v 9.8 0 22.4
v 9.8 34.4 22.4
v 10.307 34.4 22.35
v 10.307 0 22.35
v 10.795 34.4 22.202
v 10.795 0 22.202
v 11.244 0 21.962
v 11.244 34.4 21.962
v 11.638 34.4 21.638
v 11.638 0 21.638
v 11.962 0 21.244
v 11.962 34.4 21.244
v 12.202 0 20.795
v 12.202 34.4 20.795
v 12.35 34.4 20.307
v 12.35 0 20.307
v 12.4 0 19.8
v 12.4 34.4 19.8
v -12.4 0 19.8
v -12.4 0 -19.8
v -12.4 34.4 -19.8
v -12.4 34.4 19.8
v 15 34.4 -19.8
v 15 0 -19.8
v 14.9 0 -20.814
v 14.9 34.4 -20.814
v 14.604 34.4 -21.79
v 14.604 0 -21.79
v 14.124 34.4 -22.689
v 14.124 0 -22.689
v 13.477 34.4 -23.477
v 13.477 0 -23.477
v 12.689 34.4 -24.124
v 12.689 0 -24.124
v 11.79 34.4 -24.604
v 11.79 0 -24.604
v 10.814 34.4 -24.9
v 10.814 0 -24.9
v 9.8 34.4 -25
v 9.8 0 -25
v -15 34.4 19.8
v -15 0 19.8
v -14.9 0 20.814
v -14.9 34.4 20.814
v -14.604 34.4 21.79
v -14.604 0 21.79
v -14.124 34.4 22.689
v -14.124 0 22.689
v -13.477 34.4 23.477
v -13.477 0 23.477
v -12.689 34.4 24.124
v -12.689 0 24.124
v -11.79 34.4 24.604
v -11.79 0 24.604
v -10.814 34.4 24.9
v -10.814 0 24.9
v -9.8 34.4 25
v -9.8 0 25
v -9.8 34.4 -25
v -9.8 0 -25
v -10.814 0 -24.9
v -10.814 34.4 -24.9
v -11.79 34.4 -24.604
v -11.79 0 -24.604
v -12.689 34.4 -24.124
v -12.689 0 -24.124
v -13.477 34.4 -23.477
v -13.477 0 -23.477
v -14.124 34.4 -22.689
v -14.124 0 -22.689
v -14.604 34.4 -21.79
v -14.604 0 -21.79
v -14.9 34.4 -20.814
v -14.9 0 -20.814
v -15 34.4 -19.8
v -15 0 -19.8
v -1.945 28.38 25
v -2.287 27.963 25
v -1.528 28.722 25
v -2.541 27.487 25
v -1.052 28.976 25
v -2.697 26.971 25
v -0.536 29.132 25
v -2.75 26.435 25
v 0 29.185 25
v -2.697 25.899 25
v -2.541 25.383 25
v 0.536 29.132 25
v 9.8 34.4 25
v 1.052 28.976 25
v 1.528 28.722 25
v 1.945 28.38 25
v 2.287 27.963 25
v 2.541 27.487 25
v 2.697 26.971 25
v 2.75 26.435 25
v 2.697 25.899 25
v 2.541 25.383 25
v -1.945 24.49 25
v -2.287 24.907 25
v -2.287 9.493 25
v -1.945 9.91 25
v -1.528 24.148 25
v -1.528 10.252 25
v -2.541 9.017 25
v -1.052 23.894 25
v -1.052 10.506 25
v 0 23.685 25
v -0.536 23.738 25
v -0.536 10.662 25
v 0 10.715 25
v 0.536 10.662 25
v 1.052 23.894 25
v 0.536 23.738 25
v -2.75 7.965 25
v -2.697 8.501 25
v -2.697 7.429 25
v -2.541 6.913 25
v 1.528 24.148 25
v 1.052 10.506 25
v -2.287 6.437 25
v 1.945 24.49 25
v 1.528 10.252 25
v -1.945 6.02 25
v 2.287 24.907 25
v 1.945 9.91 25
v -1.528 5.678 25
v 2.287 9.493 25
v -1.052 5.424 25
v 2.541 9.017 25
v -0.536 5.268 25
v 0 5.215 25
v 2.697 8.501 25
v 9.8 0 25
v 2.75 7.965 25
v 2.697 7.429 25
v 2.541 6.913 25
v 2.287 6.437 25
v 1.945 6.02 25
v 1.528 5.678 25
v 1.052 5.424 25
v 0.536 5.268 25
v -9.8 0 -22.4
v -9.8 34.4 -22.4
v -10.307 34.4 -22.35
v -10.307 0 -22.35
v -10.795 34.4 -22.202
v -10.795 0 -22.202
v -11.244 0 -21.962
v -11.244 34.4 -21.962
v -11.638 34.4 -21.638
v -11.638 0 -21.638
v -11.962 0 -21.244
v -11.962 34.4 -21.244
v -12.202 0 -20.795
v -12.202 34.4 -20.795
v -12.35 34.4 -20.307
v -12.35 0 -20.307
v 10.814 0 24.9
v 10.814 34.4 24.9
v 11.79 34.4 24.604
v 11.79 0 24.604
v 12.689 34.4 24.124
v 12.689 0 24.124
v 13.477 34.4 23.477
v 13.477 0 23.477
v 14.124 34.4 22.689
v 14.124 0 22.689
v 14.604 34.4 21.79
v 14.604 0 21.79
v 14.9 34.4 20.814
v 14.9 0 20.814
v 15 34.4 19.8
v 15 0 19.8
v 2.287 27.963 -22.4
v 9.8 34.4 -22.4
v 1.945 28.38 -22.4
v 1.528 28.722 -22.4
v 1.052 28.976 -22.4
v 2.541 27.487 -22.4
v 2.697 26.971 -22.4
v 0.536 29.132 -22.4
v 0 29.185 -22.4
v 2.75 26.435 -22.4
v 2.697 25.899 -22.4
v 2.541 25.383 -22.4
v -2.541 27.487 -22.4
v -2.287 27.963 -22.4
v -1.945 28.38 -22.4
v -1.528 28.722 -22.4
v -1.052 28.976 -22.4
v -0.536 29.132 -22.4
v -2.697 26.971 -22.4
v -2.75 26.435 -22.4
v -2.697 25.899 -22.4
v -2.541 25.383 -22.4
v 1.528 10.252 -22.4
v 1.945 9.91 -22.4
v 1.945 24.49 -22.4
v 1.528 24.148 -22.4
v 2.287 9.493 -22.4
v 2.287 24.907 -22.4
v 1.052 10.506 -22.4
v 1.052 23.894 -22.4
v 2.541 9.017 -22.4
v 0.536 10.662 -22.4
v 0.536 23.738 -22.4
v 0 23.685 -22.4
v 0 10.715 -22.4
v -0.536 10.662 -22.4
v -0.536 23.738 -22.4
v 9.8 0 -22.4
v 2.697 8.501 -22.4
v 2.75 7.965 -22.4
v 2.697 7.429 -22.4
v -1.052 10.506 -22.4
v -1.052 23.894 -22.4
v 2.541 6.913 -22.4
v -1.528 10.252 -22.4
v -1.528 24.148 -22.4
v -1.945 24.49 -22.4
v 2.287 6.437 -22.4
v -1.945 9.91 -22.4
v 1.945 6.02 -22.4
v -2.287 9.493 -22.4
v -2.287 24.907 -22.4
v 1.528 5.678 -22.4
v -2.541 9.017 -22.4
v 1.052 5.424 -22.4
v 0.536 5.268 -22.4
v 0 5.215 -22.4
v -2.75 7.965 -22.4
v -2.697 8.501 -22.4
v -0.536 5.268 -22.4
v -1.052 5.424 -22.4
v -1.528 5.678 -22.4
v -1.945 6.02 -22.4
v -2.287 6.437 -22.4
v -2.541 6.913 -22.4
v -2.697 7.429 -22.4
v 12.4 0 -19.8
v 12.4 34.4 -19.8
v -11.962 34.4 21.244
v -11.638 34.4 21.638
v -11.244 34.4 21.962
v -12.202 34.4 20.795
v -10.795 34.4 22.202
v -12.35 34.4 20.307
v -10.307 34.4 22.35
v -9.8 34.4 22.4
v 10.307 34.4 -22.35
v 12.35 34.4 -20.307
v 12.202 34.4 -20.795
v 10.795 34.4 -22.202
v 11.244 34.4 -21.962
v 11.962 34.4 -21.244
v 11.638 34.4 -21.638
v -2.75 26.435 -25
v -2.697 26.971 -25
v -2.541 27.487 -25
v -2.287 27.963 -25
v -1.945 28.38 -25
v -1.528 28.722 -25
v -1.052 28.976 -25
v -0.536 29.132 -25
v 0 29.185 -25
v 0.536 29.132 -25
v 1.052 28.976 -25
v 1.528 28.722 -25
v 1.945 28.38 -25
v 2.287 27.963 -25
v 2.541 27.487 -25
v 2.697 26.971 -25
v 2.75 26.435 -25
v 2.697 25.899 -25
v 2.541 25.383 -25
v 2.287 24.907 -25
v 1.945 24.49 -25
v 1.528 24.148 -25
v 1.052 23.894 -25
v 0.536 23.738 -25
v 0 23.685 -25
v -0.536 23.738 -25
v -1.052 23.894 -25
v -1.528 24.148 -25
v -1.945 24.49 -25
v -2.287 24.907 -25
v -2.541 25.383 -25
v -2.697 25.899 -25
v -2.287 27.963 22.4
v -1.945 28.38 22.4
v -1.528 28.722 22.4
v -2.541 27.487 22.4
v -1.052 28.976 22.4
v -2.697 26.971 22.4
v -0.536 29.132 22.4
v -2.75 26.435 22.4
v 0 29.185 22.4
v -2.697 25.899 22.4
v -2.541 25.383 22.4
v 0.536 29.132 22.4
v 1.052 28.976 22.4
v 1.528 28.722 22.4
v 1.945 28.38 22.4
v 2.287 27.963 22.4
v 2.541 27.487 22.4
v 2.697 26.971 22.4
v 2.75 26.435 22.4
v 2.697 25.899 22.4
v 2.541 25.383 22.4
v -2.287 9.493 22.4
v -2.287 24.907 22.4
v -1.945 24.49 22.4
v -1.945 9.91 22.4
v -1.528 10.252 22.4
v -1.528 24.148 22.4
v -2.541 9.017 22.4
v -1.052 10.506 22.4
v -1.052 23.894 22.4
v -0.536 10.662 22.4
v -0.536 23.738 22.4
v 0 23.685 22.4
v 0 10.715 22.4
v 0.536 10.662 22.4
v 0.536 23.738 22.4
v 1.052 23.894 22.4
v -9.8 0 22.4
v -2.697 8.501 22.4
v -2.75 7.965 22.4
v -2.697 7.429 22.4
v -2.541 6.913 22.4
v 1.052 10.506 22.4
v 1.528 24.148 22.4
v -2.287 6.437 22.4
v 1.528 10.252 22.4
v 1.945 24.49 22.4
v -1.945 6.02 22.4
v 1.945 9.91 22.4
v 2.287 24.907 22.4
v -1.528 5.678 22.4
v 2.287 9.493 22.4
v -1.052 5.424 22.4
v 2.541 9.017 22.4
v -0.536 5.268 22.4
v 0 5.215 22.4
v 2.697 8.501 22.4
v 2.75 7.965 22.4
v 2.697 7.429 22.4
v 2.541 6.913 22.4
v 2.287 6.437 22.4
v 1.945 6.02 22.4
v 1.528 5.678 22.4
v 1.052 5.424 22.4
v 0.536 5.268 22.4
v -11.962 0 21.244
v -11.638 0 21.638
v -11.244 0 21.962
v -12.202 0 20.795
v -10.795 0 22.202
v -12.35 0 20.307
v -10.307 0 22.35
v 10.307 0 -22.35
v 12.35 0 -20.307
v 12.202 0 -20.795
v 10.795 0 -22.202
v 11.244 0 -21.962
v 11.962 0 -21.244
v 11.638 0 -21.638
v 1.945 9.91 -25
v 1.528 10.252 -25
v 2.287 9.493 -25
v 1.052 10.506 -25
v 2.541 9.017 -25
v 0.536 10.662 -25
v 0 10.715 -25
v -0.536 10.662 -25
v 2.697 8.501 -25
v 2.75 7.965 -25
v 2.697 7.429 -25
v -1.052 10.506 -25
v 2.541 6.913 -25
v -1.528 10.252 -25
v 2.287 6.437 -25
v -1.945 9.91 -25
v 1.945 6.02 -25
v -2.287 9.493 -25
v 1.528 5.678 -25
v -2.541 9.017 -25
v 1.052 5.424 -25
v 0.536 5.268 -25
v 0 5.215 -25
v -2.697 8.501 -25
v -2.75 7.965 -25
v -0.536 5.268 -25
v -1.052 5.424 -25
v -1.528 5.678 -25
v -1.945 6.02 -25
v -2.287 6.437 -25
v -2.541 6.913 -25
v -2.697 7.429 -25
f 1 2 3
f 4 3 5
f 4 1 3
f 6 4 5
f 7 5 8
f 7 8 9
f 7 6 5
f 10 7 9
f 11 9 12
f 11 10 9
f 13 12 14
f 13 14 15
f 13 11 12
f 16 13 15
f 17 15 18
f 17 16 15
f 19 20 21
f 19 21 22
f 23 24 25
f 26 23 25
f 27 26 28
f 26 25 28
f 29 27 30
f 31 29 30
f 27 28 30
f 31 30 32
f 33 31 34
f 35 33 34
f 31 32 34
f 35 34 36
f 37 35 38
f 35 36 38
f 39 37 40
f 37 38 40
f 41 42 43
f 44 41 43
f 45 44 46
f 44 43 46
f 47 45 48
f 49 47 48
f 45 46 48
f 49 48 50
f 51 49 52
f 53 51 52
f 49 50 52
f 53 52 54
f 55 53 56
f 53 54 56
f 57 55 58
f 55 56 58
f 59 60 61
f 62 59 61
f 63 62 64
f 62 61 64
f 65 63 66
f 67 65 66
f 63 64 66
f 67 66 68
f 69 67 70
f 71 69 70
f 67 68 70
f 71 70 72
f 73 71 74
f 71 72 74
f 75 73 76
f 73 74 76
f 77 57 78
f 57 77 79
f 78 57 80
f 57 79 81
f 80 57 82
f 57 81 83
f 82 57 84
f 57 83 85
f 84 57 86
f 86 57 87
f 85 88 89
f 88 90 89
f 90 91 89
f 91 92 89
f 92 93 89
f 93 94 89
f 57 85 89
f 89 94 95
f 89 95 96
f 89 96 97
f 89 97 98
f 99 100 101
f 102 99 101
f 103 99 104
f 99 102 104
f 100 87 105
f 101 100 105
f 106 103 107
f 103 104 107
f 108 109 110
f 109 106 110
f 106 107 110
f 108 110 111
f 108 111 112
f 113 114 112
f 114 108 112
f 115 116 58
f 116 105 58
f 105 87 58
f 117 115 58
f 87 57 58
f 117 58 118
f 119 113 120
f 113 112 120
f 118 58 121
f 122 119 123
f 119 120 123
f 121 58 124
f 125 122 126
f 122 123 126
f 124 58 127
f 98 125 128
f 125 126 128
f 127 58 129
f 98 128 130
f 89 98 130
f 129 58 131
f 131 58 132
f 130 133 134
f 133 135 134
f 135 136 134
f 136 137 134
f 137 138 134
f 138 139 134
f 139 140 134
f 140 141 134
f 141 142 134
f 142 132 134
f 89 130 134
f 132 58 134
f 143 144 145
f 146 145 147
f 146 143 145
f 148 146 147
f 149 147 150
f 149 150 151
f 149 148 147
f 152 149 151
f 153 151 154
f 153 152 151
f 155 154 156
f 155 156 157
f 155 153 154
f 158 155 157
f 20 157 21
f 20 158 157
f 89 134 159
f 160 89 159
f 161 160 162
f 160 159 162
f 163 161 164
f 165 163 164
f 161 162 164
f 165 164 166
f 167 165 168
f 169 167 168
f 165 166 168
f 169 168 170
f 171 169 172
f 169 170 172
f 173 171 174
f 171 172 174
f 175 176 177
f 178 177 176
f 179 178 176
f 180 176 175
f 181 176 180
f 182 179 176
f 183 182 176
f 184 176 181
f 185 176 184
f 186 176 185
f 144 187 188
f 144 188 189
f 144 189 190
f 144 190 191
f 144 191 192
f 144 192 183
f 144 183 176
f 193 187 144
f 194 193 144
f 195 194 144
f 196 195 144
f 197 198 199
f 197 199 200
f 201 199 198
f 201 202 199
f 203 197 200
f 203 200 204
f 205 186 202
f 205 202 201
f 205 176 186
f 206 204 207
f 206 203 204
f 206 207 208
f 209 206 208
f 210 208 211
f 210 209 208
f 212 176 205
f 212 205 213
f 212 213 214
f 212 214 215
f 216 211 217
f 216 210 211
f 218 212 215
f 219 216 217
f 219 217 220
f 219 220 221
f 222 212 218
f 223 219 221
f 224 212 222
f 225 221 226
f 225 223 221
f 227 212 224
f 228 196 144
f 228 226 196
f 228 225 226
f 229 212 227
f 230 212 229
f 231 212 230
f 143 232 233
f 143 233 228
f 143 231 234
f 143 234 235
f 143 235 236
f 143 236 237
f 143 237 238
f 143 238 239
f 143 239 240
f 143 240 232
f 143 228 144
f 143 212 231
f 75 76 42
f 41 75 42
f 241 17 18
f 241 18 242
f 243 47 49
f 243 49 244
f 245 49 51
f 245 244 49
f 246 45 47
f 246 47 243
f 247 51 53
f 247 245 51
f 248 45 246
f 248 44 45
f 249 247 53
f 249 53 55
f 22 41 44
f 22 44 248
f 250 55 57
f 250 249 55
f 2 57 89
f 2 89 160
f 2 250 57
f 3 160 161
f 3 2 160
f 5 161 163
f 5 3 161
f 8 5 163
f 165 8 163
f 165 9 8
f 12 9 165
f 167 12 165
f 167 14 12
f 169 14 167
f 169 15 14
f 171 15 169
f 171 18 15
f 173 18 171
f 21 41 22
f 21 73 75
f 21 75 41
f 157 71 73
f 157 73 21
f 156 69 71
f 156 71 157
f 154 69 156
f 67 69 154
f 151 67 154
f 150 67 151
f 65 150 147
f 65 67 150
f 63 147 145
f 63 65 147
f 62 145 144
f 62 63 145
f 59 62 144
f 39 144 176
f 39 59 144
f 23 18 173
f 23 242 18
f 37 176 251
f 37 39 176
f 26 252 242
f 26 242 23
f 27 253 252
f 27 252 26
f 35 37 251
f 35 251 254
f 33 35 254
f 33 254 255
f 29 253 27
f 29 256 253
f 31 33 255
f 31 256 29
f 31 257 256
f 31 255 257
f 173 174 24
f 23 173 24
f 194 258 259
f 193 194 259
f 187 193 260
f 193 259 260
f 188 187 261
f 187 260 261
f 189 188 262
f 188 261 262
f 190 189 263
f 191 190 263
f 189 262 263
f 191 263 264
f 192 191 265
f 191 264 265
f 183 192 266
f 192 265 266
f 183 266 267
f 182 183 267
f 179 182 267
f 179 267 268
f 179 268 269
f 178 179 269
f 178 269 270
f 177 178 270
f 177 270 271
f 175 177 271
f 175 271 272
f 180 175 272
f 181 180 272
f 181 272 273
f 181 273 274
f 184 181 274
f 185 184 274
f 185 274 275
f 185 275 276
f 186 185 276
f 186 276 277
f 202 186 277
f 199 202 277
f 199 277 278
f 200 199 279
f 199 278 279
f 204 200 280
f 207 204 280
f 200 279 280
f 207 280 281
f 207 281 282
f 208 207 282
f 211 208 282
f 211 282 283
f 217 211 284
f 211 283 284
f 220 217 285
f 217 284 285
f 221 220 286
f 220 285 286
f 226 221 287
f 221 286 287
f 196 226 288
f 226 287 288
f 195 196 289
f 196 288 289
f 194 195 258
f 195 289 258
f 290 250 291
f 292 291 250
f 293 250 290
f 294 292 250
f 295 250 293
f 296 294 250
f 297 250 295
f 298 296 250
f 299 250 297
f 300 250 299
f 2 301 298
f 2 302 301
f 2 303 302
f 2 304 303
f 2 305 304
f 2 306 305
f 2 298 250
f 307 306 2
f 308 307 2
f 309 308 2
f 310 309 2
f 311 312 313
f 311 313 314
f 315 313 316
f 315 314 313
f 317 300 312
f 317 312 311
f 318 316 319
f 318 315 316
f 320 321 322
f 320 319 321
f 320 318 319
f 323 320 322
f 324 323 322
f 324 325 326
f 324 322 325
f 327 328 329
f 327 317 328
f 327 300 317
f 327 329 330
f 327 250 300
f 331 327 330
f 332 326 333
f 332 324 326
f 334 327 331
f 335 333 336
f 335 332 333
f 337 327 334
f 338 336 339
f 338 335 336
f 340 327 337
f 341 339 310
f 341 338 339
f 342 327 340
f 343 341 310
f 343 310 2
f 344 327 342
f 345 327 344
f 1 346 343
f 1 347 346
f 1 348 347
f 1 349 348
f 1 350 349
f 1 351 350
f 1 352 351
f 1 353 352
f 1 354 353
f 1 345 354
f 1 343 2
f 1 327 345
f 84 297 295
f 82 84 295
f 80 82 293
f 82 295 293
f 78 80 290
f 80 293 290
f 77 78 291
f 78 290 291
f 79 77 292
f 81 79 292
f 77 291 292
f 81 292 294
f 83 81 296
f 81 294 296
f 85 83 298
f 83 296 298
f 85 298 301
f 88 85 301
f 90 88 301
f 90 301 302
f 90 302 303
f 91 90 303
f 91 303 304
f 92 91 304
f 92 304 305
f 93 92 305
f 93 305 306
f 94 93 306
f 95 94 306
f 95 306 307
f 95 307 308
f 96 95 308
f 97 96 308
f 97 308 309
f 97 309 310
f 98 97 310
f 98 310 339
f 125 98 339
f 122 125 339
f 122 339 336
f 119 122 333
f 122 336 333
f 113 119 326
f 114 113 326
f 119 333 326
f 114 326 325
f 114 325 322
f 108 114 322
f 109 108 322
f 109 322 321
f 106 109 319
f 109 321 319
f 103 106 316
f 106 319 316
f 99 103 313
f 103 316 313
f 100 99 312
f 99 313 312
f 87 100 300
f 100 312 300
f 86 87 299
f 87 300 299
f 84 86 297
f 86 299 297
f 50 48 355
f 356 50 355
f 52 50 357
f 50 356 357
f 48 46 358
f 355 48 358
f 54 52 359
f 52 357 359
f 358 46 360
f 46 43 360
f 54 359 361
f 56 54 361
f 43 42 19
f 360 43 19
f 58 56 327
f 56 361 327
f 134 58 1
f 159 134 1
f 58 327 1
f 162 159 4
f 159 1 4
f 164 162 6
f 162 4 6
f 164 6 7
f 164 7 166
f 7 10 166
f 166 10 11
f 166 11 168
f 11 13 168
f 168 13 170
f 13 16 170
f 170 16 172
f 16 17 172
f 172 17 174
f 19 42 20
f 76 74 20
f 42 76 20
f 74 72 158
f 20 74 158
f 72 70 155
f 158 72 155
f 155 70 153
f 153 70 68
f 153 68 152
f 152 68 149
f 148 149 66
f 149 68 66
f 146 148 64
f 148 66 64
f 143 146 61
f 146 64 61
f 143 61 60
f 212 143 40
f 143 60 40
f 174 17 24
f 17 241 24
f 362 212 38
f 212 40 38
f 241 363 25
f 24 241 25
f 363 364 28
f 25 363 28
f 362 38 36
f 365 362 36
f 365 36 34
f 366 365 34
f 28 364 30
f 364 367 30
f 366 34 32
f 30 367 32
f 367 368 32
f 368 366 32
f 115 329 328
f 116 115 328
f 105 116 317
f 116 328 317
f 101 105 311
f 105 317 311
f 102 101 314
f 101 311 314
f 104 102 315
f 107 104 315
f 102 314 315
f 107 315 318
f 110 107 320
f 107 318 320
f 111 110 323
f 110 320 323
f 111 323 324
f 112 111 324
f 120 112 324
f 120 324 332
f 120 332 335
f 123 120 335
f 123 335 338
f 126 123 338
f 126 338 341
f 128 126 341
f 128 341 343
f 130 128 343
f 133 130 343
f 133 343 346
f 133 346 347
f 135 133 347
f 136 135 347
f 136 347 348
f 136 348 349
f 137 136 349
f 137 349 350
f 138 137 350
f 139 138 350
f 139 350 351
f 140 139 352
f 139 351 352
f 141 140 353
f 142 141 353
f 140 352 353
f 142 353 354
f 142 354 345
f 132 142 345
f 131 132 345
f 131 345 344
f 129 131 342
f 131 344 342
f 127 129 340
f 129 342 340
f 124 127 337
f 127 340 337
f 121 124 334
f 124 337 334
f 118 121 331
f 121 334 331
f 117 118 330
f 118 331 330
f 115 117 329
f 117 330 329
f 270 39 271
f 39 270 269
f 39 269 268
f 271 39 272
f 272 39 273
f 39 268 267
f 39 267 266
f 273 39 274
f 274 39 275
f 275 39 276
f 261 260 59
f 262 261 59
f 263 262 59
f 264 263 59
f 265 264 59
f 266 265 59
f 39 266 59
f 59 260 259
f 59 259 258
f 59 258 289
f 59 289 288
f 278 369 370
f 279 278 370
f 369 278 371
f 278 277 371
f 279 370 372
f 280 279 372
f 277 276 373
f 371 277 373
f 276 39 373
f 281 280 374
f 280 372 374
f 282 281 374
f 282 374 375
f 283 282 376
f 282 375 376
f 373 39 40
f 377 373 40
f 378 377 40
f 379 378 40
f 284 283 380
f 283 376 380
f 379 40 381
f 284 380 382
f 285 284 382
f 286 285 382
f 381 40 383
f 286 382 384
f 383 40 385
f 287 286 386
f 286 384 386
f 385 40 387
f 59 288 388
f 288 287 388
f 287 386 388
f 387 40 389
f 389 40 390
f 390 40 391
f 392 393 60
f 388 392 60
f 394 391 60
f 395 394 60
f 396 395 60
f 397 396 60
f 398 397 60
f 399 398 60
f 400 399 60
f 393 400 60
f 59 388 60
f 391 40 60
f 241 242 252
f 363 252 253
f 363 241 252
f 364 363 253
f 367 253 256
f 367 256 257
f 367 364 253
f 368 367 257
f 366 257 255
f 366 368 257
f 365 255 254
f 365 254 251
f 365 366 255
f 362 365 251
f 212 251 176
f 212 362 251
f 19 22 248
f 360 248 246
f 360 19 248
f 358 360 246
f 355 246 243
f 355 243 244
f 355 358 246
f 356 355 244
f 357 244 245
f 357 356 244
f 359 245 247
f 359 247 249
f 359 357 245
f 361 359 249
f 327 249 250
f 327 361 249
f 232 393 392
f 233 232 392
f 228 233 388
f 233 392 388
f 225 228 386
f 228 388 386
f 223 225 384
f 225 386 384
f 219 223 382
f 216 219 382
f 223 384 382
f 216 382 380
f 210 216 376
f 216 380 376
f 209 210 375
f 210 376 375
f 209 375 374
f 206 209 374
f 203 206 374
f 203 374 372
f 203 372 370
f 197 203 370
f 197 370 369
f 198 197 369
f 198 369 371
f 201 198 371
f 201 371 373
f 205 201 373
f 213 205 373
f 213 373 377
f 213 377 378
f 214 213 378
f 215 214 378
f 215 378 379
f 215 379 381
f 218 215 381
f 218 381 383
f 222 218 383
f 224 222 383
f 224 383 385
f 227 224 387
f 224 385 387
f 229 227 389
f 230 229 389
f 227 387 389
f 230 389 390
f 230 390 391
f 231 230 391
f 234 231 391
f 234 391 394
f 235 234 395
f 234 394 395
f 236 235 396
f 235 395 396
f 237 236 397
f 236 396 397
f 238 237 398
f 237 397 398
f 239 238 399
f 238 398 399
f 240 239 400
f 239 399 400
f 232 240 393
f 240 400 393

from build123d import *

# Parameters (mm, degrees)
RECTANGULAR_TUBE_CONFIGURED_50_X_30_X_DEPTH = 34.4
M5_CLEARANCE_HOLE1_D                        = 5.5


with BuildPart() as part:
    # Sketch13 → Rectangular tube - configured 50 X 30 X 2.6(1) (new body)
    with BuildSketch(Plane(origin=(0, 0, 0), x_dir=(1, 0, 0), z_dir=(0, 1, 0))):
        with BuildLine():
            Line((-9.8, -25), (9.8, -25))
            ThreePointArc((9.8, -25), (13.476955262, -23.476955262), (15, -19.8))
            Line((15, -19.8), (15, 19.8))
            ThreePointArc((15, 19.8), (13.476955262, 23.476955262), (9.8, 25))
            Line((9.8, 25), (-9.8, 25))
            ThreePointArc((-9.8, 25), (-13.476955262, 23.476955262), (-15, 19.8))
            Line((-15, 19.8), (-15, -19.8))
            ThreePointArc((-15, -19.8), (-13.476955262, -23.476955262), (-9.8, -25))
        make_face()
        with BuildLine():
            Line((-9.8, -22.4), (9.8, -22.4))
            ThreePointArc((9.8, -22.4), (11.638477631, -21.638477631), (12.4, -19.8))
            Line((12.4, -19.8), (12.4, 19.8))
            ThreePointArc((12.4, 19.8), (11.638477631, 21.638477631), (9.8, 22.4))
            Line((9.8, 22.4), (-9.8, 22.4))
            ThreePointArc((-9.8, 22.4), (-11.638477631, 21.638477631), (-12.4, 19.8))
            Line((-12.4, 19.8), (-12.4, -19.8))
            ThreePointArc((-12.4, -19.8), (-11.638477631, -21.638477631), (-9.8, -22.4))
        make_face(mode=Mode.SUBTRACT)
    extrude(amount=RECTANGULAR_TUBE_CONFIGURED_50_X_30_X_DEPTH)

    # M5 Clearance Hole1 (through all)
    with Locations(Plane(origin=(0, 26.435, 25), x_dir=(1, 0, 0), z_dir=(0, 0, 1))):
        with Locations((0, 0), (0, -18.47)):
            Hole(M5_CLEARANCE_HOLE1_D / 2)


solid = part.part
